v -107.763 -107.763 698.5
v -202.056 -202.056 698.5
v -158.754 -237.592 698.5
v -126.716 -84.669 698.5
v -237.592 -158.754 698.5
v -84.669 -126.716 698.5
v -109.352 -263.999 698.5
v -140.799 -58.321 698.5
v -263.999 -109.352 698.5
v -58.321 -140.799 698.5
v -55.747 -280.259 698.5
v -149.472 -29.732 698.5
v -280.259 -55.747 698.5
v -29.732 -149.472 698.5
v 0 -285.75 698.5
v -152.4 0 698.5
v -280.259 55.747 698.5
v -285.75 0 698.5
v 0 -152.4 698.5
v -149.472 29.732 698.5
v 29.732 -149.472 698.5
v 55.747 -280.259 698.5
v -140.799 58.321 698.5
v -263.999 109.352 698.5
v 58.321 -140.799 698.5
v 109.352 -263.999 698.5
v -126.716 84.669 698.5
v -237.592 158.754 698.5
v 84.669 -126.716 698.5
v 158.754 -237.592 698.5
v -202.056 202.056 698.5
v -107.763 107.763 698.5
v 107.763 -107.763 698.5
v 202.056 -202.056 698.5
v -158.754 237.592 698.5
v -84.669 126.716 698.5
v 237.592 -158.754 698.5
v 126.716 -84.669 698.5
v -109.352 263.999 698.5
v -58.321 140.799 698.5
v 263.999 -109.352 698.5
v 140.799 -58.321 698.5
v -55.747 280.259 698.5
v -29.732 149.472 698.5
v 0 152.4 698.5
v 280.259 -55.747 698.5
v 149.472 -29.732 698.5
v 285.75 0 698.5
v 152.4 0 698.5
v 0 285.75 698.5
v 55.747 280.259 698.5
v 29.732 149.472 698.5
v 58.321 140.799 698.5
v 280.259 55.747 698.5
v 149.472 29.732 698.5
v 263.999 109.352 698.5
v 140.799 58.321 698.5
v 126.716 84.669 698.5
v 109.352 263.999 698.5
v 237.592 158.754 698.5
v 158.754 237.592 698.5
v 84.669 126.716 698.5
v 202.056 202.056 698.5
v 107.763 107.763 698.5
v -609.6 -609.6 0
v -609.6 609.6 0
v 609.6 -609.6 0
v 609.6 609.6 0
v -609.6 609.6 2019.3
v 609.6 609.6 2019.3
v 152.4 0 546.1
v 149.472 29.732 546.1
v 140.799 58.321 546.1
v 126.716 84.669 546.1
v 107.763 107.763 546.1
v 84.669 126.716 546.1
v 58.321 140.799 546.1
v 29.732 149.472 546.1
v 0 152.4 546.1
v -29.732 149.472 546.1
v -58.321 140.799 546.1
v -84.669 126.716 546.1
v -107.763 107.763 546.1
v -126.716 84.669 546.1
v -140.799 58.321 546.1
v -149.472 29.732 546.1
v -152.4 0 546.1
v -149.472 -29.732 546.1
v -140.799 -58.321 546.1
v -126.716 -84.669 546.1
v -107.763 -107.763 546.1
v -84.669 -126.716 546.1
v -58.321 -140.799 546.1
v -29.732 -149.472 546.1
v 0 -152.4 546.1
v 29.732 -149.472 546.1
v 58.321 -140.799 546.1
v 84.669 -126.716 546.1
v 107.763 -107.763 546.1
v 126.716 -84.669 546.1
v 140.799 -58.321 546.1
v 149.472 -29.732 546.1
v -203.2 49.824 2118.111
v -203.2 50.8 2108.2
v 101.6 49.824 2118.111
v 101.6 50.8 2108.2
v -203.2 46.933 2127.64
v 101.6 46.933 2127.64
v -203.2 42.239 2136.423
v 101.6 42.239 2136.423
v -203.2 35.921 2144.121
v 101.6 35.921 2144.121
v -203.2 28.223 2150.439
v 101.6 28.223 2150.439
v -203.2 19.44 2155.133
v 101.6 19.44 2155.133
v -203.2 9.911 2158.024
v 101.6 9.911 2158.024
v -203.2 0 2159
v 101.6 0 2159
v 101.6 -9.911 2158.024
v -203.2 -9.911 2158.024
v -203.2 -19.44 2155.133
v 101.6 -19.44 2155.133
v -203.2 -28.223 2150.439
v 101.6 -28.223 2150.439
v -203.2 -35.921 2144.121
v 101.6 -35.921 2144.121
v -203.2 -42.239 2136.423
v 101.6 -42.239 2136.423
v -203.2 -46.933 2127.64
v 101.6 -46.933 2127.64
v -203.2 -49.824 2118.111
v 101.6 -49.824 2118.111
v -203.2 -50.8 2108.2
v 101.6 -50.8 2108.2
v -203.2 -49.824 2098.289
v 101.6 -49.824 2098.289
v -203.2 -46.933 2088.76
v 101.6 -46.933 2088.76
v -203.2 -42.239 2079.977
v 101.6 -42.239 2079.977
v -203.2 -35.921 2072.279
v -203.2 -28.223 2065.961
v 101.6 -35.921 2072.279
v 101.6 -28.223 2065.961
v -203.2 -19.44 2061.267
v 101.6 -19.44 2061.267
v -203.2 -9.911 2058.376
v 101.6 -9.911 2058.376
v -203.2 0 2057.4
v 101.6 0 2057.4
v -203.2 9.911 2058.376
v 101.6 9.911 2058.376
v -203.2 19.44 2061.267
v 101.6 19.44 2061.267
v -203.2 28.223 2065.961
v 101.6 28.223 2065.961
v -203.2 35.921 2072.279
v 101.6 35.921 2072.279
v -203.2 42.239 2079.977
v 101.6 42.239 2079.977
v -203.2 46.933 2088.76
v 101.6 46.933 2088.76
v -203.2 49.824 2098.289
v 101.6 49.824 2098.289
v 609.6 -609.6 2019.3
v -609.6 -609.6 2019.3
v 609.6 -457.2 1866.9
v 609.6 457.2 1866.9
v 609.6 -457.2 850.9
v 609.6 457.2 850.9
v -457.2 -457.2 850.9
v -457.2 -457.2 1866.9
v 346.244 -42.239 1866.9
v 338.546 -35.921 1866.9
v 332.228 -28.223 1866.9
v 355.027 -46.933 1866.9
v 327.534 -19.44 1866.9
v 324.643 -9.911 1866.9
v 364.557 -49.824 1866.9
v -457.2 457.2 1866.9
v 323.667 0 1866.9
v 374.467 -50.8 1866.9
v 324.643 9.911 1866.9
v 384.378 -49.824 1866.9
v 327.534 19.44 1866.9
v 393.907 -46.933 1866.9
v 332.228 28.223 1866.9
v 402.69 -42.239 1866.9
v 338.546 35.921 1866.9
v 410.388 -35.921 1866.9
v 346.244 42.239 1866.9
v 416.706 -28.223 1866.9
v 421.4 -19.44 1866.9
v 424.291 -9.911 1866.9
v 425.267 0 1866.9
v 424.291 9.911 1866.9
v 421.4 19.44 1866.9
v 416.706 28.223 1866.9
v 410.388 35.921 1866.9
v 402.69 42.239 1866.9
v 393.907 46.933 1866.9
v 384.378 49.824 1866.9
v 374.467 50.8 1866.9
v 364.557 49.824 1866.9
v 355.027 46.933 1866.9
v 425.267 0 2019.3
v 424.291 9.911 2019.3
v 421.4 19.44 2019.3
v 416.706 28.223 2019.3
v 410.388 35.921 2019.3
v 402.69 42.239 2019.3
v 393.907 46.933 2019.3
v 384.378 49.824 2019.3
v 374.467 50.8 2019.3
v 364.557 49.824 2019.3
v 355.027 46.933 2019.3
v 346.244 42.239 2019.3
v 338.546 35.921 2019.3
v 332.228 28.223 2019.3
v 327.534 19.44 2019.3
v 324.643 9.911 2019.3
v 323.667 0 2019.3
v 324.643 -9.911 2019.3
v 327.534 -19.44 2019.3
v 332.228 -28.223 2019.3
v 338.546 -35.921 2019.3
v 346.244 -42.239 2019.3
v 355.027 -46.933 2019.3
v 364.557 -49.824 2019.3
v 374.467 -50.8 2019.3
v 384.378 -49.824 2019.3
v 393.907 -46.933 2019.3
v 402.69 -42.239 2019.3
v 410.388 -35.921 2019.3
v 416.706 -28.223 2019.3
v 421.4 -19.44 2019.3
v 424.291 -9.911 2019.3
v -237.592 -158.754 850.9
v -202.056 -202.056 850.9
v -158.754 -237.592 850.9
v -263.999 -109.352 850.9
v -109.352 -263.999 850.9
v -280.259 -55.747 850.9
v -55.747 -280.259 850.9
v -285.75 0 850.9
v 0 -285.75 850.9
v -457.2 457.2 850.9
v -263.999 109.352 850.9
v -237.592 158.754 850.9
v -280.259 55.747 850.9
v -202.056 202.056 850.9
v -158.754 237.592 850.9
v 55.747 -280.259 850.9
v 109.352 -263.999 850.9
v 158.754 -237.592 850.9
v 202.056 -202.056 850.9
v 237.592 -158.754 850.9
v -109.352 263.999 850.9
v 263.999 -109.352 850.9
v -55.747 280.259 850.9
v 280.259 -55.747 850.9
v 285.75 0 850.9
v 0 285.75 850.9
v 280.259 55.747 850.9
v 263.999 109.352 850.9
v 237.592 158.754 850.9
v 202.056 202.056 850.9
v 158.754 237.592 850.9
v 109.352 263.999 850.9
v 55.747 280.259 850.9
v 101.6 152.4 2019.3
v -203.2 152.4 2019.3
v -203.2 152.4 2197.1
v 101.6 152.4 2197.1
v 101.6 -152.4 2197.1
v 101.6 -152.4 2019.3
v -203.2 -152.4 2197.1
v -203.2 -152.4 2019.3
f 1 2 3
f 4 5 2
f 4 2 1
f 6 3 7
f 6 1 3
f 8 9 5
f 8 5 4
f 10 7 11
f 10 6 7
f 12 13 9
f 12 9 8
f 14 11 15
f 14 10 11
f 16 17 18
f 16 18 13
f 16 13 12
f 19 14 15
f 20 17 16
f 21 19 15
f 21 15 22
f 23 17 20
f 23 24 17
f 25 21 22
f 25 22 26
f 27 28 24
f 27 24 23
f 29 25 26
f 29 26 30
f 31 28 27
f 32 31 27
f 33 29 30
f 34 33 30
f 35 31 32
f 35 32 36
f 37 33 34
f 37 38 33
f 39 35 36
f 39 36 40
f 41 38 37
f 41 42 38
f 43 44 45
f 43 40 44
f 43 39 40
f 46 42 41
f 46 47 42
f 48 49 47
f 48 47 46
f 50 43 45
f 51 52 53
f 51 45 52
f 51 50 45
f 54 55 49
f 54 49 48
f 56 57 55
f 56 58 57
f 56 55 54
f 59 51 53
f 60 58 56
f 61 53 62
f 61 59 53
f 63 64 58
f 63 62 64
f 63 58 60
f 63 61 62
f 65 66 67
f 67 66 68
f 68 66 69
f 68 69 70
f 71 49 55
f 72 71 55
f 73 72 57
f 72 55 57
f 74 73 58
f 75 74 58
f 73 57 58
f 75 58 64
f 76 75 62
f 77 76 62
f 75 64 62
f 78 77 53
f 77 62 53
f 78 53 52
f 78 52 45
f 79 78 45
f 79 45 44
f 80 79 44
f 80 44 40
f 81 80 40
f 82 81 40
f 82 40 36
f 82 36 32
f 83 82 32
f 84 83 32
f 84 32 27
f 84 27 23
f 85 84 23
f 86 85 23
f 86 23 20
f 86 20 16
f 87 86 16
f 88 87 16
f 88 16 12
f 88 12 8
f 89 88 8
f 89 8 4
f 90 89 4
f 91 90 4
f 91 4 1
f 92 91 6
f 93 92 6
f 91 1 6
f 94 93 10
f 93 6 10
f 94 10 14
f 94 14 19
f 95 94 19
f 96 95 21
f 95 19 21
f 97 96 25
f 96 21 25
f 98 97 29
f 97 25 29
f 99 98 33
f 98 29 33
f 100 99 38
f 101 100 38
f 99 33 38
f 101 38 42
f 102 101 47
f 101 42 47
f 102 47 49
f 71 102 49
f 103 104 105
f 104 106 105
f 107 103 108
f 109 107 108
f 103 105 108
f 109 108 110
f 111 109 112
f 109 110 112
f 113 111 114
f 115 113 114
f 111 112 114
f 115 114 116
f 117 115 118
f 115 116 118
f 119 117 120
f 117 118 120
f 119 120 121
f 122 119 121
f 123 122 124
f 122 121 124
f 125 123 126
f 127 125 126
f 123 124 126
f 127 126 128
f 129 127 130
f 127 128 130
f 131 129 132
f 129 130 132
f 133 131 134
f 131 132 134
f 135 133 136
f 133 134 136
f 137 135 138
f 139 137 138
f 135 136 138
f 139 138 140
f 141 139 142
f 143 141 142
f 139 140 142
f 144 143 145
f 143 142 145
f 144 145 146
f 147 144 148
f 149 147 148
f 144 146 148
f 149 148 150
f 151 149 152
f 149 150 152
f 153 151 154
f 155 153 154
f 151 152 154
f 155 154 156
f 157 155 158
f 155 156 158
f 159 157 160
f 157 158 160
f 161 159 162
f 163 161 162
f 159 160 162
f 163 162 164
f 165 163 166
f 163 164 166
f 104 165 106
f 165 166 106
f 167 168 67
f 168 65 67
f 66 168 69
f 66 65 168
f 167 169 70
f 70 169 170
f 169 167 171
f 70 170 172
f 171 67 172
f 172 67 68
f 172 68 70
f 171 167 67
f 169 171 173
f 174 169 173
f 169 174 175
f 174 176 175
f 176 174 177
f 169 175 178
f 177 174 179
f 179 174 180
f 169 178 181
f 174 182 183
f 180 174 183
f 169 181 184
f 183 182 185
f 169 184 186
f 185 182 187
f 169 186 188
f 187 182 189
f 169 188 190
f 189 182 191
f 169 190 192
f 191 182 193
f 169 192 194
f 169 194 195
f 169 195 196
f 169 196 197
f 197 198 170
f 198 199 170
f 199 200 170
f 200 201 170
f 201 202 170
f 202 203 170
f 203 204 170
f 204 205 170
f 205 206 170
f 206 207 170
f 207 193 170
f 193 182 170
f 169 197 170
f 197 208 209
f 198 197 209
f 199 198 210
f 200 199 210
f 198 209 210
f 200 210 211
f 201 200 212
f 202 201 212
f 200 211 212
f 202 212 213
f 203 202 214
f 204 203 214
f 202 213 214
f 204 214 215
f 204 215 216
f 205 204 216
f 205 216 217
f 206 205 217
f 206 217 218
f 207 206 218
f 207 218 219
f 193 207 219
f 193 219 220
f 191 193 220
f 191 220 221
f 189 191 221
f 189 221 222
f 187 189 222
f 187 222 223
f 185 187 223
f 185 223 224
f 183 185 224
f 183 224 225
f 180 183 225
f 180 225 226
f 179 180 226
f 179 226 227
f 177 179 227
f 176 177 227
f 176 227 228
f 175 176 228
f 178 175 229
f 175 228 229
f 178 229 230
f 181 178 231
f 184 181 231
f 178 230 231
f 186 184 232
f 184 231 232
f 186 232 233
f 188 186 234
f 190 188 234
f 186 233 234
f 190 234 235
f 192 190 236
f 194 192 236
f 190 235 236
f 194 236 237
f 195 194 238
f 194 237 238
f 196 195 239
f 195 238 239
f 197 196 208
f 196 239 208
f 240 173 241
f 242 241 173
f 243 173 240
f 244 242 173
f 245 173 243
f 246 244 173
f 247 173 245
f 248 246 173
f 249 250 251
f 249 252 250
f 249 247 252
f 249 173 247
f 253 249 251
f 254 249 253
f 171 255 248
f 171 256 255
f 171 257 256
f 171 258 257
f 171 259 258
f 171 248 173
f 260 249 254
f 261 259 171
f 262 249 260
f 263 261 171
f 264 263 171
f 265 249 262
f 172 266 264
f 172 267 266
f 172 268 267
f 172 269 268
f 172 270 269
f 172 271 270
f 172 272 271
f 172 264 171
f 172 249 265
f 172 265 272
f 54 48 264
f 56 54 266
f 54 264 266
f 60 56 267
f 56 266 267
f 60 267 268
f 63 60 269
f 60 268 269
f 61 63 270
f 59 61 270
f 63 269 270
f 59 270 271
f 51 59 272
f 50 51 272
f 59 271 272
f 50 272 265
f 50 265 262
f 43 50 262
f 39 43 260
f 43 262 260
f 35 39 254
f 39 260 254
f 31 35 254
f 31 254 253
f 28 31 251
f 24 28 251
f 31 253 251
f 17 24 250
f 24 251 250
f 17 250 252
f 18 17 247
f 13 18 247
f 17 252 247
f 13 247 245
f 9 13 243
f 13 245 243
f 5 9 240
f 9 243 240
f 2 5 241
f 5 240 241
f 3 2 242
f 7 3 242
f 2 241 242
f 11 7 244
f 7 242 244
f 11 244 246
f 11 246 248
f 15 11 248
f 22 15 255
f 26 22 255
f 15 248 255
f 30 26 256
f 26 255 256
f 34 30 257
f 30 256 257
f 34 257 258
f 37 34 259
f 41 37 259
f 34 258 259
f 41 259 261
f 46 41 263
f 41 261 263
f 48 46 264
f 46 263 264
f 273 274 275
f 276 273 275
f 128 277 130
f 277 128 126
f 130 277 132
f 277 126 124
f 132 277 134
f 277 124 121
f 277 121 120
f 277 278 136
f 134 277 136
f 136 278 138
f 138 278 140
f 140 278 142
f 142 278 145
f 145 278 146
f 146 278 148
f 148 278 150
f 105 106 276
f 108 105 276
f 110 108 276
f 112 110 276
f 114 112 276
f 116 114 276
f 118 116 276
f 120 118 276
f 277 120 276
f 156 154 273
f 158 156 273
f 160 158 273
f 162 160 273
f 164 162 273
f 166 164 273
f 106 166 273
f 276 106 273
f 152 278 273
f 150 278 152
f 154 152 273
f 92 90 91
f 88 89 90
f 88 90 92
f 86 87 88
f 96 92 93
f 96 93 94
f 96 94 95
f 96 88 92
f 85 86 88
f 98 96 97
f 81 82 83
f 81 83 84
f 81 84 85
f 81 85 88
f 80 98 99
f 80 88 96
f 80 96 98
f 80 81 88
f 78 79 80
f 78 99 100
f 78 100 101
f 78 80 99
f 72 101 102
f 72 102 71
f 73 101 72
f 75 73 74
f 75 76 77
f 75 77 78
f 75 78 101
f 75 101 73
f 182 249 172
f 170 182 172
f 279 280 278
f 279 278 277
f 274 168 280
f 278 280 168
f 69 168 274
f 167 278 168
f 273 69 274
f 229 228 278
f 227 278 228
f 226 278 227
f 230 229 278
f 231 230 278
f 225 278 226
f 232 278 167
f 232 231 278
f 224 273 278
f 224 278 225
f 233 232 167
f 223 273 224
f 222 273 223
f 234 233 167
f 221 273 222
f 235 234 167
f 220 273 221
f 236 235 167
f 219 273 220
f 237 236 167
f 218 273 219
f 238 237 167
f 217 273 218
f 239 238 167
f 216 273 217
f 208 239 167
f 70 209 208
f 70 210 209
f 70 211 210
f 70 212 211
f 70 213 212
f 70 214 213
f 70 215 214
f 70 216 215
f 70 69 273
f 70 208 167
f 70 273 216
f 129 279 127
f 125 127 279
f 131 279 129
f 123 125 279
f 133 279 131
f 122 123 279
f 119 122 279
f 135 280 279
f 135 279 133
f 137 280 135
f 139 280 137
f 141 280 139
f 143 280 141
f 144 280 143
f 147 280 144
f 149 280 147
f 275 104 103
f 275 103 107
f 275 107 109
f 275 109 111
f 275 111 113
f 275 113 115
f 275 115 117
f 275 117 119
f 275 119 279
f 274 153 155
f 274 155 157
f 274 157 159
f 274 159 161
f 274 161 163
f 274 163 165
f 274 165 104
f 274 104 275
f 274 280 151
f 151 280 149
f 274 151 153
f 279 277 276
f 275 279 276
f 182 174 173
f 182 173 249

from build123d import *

# Parameters (mm, degrees)
F0_W      = 1219.2
F0_H      = 1219.2
F1_DEPTH  = 850.9
F2_R      = 152.4
F3_DEPTH  = 304.8
F4_R      = 285.75
F5_DEPTH  = 152.4
F7_DEPTH  = 1016
F8_W      = 1219.2
F8_H      = 1219.2
F9_DEPTH  = 152.4
F10_W     = 203.2
F10_H     = 304.8
F11_DEPTH = 177.8
F12_R     = 50.8
F13_DEPTH = 622.3
F15_DEPTH = 304.8
F16_R     = 50.8
F17_DEPTH = 304.8


with BuildPart() as f1:
    # F0 (on Top) → F1 (new body)
    with BuildSketch(Plane.XY):
        Rectangle(F0_W, F0_H)
    extrude(amount=F1_DEPTH)

    # F2 (on face) → F3 (cut)
    with BuildSketch(Plane.XY.offset(850.9)):
        Circle(F2_R)
    extrude(amount=-F3_DEPTH, mode=Mode.SUBTRACT)

    # F4 (on face) → F5 (cut)
    with BuildSketch(Plane.XY.offset(850.9)):
        Circle(F4_R)
    extrude(amount=-F5_DEPTH, mode=Mode.SUBTRACT)

    # F6 (on face) → F7 (join)
    with BuildSketch(Plane.XY.offset(850.9)):
        Polygon((-609.6, -609.6), (609.6, -609.6), (609.6, -457.2), (-457.2, -457.2), (-457.2, 457.2), (609.6, 457.2), (609.6, 609.6), (-609.6, 609.6), align=None)
    extrude(amount=F7_DEPTH)

    # F8 (on face) → F9 (join)
    with BuildSketch(Plane.XY.offset(1866.9)):
        Rectangle(F8_W, F8_H)
    extrude(amount=F9_DEPTH)

    # F10 (on face) → F11 (join)
    with BuildSketch(Plane.XY.offset(2019.3)):
        Rectangle(F10_W, F10_H)
    extrude(amount=F11_DEPTH)

    # F12 (on face) → F13 (cut)
    with BuildSketch(Plane.YZ.offset(101.6)):
        with Locations((0, 2108.2)):
            Circle(F12_R)
    extrude(amount=-F13_DEPTH, mode=Mode.SUBTRACT)

    # F15 (add): a face of the model
    f15_faces = [f1.faces().sort_by_distance(p)[0] for p in [
        (101.6, -148.8713192267, 2108.2),
    ]]
    extrude(f15_faces, amount=-F15_DEPTH)

    # F16 (on face) → F17 (cut)
    with BuildSketch(Plane.XY.offset(2019.3)):
        with Locations((374.4671290531, 0)):
            Circle(F16_R)
    extrude(amount=-F17_DEPTH, mode=Mode.SUBTRACT)


solid = f1.part
